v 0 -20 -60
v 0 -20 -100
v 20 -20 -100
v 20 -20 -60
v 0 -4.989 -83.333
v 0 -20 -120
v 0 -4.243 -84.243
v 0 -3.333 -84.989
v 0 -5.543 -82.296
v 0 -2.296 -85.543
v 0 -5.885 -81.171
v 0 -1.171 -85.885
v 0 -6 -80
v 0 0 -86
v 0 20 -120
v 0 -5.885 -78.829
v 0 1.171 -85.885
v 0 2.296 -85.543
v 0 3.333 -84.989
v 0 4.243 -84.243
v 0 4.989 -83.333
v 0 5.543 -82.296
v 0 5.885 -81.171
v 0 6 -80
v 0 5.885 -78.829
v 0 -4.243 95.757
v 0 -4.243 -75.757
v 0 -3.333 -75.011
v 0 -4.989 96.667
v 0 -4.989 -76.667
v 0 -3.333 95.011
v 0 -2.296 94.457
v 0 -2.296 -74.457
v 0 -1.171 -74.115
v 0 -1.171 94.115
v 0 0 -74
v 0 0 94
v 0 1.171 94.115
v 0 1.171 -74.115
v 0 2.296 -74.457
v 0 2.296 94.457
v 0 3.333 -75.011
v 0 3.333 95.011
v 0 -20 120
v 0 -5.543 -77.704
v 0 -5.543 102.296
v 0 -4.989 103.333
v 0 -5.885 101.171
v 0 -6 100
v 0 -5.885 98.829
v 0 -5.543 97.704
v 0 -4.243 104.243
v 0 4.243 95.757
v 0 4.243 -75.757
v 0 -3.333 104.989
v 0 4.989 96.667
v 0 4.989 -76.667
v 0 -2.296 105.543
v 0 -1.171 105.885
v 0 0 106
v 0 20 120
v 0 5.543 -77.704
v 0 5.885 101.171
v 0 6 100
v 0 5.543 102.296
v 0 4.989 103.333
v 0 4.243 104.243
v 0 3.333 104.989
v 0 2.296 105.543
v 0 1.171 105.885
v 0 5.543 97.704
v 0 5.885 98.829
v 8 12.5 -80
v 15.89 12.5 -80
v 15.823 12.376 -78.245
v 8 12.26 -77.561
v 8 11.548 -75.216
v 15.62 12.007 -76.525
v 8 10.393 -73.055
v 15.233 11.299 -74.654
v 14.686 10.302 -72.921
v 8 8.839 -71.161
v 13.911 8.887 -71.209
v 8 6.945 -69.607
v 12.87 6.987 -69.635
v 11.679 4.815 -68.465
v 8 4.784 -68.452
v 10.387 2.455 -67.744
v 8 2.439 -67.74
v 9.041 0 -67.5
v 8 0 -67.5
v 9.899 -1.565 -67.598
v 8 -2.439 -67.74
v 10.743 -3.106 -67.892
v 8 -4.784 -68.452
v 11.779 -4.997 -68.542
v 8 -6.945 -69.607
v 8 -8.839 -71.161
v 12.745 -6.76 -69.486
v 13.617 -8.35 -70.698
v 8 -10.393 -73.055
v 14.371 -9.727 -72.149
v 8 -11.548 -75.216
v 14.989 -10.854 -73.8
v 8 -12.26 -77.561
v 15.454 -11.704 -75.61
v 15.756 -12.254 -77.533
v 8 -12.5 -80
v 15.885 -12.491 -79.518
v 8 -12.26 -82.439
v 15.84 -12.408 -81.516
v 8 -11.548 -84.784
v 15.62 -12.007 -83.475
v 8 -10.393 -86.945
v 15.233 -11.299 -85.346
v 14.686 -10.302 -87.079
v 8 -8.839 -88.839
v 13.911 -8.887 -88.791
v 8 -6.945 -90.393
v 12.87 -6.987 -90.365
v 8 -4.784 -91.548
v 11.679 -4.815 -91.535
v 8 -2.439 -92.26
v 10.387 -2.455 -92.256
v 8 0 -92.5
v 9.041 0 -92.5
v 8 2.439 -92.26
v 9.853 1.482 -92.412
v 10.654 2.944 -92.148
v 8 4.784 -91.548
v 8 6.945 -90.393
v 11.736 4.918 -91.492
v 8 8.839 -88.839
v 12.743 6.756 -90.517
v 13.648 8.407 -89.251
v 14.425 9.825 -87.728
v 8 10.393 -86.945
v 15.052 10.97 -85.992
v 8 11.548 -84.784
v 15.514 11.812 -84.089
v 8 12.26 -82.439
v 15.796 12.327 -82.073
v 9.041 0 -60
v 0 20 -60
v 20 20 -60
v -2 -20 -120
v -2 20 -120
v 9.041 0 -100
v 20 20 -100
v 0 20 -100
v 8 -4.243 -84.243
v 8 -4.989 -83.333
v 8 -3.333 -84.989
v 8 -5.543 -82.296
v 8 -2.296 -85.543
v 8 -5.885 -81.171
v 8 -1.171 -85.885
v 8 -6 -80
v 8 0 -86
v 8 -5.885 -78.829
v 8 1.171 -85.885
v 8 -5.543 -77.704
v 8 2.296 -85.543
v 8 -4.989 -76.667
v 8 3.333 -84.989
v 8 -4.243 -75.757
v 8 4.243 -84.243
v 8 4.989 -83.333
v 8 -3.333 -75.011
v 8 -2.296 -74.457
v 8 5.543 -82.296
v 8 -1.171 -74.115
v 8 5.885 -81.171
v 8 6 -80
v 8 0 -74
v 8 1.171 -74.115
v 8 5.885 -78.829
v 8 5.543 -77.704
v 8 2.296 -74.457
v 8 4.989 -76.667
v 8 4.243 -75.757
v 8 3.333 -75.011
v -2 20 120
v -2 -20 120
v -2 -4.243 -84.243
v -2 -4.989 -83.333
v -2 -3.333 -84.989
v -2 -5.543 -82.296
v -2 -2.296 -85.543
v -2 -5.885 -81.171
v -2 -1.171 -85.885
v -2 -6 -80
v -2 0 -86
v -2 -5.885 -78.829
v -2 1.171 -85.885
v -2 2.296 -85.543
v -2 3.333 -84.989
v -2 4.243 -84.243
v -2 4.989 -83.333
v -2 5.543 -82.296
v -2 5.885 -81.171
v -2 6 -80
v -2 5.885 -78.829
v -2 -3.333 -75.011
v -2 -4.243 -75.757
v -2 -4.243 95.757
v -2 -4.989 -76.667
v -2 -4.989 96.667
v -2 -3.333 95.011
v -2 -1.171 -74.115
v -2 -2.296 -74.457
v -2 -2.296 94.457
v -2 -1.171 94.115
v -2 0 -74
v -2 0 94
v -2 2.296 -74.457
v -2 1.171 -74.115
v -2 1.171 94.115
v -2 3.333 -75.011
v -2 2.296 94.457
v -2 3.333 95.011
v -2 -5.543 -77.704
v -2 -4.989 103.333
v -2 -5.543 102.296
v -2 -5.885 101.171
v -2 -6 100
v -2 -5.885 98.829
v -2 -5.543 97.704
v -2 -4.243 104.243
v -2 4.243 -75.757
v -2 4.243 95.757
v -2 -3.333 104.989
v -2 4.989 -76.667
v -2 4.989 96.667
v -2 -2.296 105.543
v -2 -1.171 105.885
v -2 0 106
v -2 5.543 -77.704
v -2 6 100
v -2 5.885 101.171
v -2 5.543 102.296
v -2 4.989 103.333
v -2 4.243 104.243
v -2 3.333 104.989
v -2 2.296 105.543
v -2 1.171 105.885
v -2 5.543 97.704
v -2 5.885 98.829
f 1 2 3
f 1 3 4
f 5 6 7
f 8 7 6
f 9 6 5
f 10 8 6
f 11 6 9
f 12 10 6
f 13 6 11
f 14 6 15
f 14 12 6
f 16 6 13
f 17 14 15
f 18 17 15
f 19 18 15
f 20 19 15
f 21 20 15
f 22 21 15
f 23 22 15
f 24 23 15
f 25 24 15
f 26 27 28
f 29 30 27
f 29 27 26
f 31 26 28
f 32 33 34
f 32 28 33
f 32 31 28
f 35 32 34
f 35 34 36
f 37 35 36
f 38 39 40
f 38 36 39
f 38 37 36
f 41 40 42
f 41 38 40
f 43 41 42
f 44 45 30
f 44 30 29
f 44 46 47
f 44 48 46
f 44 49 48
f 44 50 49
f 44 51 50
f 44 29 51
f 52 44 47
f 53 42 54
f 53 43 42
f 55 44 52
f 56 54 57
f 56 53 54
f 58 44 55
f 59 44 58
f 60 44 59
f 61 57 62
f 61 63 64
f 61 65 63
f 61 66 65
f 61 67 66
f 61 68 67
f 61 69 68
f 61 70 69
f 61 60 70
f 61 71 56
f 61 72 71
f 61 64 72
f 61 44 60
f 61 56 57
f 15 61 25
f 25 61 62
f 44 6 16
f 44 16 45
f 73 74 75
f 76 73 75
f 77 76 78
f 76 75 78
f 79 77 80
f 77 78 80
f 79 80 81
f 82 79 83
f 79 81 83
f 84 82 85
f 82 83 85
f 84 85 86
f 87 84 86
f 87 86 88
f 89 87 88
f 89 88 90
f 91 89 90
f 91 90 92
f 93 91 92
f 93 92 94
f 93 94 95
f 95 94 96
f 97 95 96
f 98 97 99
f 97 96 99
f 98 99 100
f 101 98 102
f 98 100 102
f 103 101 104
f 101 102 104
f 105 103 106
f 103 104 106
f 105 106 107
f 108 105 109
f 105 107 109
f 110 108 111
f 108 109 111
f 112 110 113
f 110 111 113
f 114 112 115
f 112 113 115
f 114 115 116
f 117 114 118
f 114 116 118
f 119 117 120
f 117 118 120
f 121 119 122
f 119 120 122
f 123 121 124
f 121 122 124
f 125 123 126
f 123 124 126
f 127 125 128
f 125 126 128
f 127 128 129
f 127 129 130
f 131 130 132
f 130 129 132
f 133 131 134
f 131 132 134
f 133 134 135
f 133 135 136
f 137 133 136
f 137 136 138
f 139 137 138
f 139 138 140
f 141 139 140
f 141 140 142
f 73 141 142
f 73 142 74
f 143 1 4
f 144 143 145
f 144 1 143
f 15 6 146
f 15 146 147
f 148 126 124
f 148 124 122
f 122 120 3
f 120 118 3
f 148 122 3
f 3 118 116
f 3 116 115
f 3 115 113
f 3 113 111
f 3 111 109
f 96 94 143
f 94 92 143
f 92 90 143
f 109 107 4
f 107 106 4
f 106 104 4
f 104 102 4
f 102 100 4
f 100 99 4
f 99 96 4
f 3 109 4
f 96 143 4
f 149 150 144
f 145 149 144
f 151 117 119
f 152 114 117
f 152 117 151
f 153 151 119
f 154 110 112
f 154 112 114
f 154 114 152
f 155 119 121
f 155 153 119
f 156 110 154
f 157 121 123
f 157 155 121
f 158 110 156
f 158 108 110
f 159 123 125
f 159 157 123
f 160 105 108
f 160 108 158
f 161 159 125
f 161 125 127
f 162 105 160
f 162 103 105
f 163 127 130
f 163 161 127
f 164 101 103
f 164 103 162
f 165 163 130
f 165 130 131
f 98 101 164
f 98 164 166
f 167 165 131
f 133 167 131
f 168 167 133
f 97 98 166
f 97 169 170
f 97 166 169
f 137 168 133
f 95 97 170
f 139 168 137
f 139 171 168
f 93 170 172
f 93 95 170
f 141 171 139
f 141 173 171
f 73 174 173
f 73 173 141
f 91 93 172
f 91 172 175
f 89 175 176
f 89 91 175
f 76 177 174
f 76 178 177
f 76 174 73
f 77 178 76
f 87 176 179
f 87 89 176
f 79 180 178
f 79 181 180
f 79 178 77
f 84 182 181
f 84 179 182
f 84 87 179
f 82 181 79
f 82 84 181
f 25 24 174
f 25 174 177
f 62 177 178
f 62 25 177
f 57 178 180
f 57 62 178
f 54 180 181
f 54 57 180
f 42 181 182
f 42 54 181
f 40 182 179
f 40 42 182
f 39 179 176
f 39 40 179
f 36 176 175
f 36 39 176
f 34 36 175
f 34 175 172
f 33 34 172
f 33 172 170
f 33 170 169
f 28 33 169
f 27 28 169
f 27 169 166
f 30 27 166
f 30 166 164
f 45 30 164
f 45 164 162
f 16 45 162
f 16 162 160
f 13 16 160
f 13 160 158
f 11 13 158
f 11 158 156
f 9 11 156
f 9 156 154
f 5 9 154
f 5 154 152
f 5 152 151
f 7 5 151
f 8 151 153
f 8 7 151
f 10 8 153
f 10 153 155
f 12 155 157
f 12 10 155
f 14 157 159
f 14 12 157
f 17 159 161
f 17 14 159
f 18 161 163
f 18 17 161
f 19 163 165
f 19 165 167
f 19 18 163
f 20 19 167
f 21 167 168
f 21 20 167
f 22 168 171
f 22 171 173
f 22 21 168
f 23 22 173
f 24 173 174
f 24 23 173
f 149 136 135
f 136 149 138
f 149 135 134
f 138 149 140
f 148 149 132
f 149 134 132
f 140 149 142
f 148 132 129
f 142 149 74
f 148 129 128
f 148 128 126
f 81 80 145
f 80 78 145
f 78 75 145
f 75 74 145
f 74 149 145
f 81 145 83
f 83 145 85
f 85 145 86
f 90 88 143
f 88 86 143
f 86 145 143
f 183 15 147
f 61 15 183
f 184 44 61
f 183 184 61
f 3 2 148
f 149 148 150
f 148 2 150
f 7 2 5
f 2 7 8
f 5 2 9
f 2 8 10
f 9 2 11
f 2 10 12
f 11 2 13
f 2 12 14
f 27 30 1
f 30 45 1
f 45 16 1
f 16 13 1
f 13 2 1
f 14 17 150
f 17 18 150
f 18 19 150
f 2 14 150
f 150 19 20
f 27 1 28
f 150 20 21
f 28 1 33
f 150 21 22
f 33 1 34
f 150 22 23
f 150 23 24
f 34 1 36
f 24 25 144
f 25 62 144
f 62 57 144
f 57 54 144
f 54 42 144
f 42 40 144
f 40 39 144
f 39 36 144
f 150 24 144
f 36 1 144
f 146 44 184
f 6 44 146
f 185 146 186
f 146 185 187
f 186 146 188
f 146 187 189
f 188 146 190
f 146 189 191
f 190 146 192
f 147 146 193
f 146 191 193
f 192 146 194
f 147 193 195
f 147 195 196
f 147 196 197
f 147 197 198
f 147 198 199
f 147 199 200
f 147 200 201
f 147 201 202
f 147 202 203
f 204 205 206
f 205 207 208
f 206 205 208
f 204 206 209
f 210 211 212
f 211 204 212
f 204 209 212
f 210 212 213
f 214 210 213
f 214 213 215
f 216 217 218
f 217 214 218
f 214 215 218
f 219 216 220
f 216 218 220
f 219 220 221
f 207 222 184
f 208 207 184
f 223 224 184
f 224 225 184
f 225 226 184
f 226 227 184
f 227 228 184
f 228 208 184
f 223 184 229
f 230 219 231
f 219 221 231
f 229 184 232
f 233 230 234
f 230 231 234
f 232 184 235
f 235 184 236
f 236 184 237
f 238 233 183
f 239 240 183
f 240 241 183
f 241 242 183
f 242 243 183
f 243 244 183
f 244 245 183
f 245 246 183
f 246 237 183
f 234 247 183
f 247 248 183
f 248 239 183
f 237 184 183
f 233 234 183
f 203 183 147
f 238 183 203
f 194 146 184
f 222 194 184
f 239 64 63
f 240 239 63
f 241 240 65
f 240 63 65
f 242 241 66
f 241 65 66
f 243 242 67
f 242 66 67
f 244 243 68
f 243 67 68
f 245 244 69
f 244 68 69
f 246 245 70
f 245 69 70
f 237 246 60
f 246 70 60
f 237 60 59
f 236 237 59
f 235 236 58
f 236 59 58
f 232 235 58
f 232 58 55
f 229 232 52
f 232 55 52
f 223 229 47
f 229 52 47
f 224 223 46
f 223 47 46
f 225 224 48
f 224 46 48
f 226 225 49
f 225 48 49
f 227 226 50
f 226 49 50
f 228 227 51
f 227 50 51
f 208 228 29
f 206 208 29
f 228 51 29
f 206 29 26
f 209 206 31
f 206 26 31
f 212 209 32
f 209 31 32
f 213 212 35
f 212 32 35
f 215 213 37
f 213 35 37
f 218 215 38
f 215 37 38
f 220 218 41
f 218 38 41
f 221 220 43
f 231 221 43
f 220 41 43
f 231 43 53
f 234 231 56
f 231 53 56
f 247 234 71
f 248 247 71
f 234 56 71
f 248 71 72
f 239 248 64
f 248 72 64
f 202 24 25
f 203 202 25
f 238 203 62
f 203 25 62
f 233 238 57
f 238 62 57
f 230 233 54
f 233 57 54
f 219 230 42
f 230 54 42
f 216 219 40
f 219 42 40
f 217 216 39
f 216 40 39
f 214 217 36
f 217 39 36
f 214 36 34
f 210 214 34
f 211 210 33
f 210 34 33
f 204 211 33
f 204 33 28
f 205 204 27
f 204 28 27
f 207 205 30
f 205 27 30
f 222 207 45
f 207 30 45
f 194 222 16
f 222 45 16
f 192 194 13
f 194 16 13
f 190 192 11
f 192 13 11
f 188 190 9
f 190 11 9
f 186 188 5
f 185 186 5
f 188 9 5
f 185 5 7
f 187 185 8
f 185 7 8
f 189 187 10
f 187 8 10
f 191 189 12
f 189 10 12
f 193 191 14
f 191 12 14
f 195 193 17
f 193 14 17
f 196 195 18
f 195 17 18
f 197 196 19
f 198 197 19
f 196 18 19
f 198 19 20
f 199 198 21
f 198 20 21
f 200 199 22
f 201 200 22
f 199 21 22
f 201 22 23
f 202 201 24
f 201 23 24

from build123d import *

# Parameters (mm, degrees)
F0_W     = 40
F0_H     = 20
F0_H_2   = 180
F0_R     = 6
F0_H_3   = 40
F1_DEPTH = 2
F2_DEPTH = 20
F3_R     = 12.5
F3_R_2   = 6
F4_DEPTH = 12
F6_DEPTH = 60.001


with BuildPart() as f1:
    # F0 (on Right) → F1 (new body)
    with BuildSketch(Plane.YZ):
        with Locations((0, -110)):
            Rectangle(F0_W, F0_H)
        with Locations((0, 30)):
            Rectangle(F0_W, F0_H_2)
        with Locations((0, 100)):
            Circle(F0_R, mode=Mode.SUBTRACT)
        with Locations((0, -80)):
            Rectangle(F0_W, F0_H_3)
        with Locations((0, -80)):
            Circle(F0_R, mode=Mode.SUBTRACT)
    extrude(amount=-F1_DEPTH)


with BuildPart() as f2:
    # F0 (on Right) → F2 (new body)
    with BuildSketch(Plane.YZ):
        with Locations((0, -80)):
            Rectangle(F0_W, F0_H_3)
        with Locations((0, -80)):
            Circle(F0_R, mode=Mode.SUBTRACT)
    extrude(amount=F2_DEPTH)

    # F3 (on face) → F4 (cut)
    with BuildSketch(Plane.YZ.offset(20)):
        with Locations((0, -80)):
            Circle(F3_R)
        with Locations((0, -80)):
            Circle(F3_R_2, mode=Mode.SUBTRACT)
    extrude(amount=-F4_DEPTH, mode=Mode.SUBTRACT)

    # F5 (on face) → F6 (cut, through all)
    with BuildSketch(Plane.XY.offset(-60)):
        Polygon((9.041194, 0), (20, -20), (20, 20), align=None)
    extrude(amount=-F6_DEPTH, mode=Mode.SUBTRACT)


solid = Compound([f1.part, f2.part])
